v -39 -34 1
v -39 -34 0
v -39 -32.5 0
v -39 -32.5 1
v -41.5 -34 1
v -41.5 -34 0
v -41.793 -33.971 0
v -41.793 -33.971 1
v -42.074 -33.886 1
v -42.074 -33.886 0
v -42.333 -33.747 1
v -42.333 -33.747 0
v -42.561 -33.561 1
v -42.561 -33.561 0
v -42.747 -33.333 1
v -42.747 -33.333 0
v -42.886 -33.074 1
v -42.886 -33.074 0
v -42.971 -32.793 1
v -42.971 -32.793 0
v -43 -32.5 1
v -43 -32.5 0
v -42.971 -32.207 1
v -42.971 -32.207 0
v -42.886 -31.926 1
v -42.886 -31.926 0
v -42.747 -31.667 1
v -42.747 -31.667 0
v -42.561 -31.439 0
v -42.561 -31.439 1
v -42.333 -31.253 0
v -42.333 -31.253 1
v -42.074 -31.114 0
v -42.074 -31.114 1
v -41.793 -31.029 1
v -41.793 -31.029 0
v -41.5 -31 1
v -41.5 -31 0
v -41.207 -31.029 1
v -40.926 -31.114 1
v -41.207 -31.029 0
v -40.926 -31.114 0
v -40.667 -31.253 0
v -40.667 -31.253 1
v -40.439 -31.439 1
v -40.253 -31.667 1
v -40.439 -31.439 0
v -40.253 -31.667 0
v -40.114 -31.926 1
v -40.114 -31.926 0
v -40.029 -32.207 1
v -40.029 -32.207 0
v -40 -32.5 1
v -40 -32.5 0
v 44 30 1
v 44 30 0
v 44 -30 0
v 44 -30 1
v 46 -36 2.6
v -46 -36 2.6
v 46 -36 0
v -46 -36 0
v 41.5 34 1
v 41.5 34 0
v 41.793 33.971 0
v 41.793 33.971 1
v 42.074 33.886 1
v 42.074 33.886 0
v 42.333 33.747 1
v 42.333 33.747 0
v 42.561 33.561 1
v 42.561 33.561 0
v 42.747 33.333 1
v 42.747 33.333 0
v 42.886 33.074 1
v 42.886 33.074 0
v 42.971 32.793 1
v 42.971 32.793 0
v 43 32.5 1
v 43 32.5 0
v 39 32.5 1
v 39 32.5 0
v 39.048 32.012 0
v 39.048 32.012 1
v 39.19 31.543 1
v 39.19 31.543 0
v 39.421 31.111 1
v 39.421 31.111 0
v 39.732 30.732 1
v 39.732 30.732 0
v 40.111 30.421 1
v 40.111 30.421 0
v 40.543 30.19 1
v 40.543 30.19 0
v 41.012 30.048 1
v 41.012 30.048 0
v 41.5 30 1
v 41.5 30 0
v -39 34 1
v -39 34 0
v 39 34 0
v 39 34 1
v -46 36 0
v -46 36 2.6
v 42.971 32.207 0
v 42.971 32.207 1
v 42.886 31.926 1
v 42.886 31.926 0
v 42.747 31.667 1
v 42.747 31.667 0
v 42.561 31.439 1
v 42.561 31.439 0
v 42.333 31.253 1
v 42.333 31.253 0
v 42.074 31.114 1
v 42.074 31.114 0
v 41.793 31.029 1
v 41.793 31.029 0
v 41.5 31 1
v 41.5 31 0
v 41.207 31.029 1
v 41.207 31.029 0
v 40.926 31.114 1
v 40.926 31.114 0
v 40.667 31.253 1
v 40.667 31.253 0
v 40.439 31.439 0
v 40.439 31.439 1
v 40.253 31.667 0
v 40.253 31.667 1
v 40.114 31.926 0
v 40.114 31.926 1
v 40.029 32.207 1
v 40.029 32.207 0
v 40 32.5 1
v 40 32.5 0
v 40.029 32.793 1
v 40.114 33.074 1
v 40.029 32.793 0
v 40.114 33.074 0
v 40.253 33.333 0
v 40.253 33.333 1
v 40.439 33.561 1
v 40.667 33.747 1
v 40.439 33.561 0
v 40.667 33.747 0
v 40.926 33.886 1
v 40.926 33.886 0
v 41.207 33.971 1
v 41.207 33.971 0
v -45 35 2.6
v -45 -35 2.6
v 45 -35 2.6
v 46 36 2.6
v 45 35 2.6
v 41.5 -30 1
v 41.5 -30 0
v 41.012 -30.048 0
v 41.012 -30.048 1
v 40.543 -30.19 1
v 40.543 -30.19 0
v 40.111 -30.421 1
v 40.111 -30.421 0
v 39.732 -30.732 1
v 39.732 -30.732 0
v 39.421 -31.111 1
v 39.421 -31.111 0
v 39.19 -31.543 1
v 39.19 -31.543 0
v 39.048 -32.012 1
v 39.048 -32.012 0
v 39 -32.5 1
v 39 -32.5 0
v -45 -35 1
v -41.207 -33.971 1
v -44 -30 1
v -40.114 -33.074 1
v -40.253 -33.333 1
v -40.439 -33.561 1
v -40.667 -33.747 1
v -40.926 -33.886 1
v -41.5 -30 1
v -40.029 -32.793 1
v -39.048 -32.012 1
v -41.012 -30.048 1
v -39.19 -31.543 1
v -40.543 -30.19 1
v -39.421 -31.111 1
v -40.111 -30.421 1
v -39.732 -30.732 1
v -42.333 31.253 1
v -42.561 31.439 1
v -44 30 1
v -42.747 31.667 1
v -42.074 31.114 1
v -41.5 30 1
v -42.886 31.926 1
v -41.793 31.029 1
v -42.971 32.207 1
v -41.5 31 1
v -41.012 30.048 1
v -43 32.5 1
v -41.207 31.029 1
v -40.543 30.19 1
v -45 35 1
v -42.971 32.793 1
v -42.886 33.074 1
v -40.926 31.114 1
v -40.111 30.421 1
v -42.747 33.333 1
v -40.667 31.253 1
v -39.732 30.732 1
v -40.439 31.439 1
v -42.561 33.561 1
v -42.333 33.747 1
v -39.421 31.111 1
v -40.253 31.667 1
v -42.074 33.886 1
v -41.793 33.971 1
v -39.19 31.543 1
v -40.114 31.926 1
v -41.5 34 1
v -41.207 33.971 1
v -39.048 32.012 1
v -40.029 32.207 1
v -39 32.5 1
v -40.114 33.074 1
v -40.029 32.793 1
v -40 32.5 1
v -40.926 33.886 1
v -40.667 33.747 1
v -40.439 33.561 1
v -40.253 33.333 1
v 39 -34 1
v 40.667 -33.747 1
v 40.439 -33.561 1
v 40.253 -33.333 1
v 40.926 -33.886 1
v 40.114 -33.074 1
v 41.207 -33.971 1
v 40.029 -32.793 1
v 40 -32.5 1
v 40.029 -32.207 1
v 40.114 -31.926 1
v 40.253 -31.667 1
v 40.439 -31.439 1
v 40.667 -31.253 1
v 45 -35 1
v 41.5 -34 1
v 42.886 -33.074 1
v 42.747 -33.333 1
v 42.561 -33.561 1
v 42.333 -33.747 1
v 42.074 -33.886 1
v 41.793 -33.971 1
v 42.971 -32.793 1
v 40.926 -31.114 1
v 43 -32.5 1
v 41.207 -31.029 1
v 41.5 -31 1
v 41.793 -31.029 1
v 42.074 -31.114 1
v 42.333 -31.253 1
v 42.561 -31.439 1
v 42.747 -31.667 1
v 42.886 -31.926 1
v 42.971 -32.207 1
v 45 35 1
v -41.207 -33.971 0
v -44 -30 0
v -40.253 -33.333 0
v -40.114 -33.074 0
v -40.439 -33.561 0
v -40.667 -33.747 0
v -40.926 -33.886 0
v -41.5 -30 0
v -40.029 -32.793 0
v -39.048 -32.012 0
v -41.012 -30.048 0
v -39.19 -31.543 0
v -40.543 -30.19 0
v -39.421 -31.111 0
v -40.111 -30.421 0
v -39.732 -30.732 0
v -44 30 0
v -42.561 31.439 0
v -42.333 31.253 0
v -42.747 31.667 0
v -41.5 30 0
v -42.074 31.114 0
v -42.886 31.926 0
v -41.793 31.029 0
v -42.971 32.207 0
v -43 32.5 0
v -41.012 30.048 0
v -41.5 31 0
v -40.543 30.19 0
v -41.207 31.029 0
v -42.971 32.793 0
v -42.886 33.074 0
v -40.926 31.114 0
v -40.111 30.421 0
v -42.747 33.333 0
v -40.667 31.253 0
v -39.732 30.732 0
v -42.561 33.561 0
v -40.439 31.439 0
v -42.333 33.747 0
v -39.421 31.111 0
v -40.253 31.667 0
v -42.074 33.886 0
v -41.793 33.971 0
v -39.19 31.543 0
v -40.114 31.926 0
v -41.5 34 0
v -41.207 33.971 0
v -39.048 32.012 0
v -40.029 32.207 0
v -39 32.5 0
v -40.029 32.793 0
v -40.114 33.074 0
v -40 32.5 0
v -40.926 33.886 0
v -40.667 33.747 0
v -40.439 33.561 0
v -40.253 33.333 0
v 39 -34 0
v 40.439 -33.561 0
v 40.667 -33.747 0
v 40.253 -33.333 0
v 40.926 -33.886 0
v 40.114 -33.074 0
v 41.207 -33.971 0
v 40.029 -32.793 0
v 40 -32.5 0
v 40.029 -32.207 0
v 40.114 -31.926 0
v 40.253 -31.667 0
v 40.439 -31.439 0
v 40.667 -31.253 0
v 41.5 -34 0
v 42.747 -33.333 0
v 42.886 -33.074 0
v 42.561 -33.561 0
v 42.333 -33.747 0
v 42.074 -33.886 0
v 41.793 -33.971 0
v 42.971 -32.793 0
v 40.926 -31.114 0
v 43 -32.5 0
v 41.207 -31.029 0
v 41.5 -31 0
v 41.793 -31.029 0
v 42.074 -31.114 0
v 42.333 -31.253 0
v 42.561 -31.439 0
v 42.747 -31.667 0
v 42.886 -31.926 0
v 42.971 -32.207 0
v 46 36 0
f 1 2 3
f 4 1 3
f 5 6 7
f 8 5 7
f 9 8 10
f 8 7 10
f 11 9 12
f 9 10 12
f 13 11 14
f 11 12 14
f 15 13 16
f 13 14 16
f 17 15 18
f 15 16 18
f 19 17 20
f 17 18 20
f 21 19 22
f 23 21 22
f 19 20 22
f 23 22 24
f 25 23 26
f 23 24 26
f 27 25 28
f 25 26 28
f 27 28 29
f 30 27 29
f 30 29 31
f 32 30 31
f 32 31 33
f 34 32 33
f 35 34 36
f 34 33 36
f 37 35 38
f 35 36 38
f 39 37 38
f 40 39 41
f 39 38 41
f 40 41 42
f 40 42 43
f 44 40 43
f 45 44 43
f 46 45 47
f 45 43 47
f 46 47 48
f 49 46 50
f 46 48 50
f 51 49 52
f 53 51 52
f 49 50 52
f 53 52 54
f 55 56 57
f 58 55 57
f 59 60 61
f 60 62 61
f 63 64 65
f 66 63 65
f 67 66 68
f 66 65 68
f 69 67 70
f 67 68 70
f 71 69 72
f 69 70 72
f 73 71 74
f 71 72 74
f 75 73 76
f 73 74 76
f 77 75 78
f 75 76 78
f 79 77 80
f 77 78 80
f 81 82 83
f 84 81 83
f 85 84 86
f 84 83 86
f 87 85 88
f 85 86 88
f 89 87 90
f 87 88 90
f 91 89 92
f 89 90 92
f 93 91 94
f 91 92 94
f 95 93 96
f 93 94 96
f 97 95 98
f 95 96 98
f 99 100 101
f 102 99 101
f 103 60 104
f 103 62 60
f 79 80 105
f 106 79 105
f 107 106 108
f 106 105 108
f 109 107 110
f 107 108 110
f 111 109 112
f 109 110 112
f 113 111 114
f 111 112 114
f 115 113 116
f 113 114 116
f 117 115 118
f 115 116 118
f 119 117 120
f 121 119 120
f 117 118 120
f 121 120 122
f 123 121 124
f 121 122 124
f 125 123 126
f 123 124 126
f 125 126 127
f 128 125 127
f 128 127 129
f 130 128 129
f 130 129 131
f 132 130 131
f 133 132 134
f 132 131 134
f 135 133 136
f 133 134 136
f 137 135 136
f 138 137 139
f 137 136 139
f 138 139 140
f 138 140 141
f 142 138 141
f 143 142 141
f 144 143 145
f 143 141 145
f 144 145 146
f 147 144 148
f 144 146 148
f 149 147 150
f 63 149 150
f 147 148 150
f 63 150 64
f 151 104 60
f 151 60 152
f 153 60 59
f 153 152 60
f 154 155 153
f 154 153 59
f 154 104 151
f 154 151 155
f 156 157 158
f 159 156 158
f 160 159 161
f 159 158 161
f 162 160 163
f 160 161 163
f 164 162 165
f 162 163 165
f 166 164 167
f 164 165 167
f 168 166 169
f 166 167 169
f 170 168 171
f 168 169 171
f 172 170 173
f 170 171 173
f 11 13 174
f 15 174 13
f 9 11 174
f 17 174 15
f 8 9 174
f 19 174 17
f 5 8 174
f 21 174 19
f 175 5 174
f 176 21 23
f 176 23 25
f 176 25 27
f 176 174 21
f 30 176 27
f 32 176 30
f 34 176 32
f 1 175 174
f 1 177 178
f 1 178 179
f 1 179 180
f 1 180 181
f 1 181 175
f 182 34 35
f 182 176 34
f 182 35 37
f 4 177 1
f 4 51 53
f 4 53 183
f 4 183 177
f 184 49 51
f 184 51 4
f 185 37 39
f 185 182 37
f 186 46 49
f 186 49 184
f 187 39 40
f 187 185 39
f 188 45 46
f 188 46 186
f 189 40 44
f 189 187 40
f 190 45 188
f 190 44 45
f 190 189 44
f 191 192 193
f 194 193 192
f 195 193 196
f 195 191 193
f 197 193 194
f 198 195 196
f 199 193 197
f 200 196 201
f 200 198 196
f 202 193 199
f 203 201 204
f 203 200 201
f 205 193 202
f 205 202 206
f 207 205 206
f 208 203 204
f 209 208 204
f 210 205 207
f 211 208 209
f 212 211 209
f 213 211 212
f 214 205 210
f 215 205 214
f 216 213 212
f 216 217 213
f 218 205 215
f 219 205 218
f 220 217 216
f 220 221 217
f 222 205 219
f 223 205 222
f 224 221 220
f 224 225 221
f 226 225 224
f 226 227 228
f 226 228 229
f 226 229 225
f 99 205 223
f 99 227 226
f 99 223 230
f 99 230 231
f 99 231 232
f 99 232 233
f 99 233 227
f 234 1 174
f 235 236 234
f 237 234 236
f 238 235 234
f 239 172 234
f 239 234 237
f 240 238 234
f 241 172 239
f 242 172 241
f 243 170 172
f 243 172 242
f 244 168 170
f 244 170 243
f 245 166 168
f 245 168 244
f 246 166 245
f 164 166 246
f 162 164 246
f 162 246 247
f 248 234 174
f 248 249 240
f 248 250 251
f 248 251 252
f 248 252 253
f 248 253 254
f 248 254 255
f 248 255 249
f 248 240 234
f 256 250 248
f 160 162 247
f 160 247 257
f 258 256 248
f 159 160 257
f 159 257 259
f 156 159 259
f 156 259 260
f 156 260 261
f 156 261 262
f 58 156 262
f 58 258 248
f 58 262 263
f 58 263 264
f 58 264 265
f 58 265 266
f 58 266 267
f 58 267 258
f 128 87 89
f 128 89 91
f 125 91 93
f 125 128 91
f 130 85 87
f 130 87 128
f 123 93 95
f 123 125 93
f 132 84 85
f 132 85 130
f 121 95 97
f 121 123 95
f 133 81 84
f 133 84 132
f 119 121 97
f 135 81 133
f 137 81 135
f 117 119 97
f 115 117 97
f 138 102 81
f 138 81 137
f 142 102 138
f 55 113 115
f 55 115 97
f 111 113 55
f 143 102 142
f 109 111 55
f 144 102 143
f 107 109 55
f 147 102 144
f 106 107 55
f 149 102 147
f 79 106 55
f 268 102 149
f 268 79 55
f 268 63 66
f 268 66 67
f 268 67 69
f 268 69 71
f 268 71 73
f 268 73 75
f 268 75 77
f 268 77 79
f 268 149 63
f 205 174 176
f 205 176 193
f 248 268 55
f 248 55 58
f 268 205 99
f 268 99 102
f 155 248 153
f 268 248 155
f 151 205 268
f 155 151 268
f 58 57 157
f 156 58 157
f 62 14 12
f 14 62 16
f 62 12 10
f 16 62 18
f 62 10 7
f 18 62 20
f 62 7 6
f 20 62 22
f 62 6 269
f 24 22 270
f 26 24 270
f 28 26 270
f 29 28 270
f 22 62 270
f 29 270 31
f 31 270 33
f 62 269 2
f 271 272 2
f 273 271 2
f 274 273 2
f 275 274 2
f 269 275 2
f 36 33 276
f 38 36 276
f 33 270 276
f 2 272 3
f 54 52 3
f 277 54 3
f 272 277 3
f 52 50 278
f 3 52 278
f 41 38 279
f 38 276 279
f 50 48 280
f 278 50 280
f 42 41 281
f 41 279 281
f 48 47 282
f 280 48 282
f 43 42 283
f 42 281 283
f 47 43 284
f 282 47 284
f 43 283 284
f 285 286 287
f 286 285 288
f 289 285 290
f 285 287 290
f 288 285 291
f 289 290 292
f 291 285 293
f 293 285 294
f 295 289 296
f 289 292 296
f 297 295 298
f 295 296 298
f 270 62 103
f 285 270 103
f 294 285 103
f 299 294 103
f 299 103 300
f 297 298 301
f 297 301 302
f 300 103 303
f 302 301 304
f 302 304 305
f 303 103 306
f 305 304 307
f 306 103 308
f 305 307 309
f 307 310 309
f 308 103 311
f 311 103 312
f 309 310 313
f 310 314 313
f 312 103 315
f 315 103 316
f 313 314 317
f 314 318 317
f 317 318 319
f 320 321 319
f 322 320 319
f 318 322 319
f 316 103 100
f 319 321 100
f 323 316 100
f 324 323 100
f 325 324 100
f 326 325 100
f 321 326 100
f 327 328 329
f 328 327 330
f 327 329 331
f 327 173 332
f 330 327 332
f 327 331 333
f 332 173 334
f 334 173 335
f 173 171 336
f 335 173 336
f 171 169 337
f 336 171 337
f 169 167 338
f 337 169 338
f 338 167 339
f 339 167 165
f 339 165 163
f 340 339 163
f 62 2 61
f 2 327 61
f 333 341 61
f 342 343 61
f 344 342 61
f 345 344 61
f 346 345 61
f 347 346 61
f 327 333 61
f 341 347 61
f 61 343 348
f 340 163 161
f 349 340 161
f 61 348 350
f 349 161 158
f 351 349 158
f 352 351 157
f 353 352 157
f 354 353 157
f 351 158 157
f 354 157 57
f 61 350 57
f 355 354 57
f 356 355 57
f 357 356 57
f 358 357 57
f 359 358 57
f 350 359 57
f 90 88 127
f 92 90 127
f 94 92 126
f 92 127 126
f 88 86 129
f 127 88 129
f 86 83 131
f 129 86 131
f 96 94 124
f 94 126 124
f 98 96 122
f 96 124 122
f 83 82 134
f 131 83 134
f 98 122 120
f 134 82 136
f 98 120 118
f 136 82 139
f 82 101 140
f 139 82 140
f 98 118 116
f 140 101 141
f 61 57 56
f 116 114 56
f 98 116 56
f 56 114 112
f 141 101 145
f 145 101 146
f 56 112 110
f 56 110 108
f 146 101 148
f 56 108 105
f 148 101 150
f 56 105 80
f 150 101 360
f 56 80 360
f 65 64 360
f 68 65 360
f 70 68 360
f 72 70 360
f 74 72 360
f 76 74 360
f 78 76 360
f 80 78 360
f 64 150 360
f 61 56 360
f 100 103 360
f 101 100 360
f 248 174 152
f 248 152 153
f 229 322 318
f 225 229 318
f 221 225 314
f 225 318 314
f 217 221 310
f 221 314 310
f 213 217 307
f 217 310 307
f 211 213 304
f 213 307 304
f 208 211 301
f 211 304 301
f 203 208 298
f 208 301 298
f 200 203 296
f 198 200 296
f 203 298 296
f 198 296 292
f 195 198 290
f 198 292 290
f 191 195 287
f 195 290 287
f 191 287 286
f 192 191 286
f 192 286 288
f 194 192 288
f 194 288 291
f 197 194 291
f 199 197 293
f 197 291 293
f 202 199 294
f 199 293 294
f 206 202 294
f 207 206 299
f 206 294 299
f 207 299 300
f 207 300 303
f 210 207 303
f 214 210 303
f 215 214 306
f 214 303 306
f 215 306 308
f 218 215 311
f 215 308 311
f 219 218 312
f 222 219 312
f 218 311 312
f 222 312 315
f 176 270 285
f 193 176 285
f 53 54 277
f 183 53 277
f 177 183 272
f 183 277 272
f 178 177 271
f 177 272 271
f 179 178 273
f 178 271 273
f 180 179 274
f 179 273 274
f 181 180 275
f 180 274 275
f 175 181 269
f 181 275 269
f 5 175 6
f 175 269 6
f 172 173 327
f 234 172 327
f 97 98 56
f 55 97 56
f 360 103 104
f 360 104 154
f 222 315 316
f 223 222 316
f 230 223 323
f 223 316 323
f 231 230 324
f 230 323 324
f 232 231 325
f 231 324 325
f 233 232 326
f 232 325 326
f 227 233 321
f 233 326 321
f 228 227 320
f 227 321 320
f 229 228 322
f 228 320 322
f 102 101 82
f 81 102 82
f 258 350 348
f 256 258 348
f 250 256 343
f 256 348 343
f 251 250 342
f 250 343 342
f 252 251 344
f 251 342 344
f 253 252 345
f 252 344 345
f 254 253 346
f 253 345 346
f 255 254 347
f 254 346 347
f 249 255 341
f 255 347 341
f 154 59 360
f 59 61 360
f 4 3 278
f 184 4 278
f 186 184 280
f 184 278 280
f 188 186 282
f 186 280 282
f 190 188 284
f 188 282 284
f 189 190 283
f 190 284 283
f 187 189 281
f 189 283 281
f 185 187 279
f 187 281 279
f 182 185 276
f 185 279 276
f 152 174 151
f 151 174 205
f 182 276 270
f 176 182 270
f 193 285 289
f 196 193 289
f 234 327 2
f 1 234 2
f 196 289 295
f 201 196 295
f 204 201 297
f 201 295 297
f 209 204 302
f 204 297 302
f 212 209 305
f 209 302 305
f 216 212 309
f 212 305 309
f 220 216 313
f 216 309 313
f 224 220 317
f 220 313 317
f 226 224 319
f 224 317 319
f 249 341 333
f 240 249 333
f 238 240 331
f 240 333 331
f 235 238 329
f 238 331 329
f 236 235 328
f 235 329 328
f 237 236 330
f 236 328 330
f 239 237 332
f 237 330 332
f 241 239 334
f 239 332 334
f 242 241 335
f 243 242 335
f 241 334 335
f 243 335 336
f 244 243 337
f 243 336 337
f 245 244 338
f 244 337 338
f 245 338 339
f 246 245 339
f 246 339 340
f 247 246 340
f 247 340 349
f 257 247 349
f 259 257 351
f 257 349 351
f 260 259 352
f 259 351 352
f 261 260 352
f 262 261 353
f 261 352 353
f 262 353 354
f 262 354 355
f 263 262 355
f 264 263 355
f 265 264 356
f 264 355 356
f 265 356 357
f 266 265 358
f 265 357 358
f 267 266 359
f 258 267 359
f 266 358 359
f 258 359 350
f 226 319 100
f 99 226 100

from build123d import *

# Parameters (mm, degrees)
F0_W     = 92
F0_H     = 72
F1_DEPTH = 1
F2_W     = 92
F2_H     = 72
F2_W_2   = 90
F2_H_2   = 70
F3_DEPTH = 1.6


with BuildPart() as f1:
    # F0 (on Top) → F1 (new body)
    with BuildSketch(Plane.XY):
        Rectangle(F0_W, F0_H)
        Polygon((-41.5, 34), (-39, 34), (39, 34), (41.5, 34), (44, 34), (44, 30), (44, -30), (44, -34), (41.5, -34), (39, -34), (-39, -34), (-41.5, -34), (-44, -34), (-44, -30), (-44, 30), (-44, 34), align=None, mode=Mode.SUBTRACT)
        with BuildLine():
            Line((41.5, 34), (39, 34))
            Line((39, 34), (39, 32.5))
            ThreePointArc((39, 32.5), (39.732233, 30.732233), (41.5, 30))
            Line((41.5, 30), (44, 30))
            Line((44, 30), (44, 34))
            Line((44, 34), (41.5, 34))
        make_face()
        with BuildLine():
            ThreePointArc((43, 32.5), (40.43934, 31.43934), (41.5, 34))
            ThreePointArc((41.5, 34), (42.56066, 33.56066), (43, 32.5))
        make_face(mode=Mode.SUBTRACT)
        with BuildLine():
            Line((44, -34), (44, -30))
            Line((44, -30), (41.5, -30))
            ThreePointArc((41.5, -30), (39.732233, -30.732233), (39, -32.5))
            Line((39, -32.5), (39, -34))
            Line((39, -34), (41.5, -34))
            Line((41.5, -34), (44, -34))
        make_face()
        with BuildLine():
            ThreePointArc((43, -32.5), (42.56066, -33.56066), (41.5, -34))
            ThreePointArc((41.5, -34), (40.43934, -31.43934), (43, -32.5))
        make_face(mode=Mode.SUBTRACT)
        with BuildLine():
            Line((-41.5, -30), (-44, -30))
            Line((-44, -30), (-44, -34))
            Line((-44, -34), (-41.5, -34))
            Line((-41.5, -34), (-39, -34))
            Line((-39, -34), (-39, -32.5))
            ThreePointArc((-39, -32.5), (-39.732233, -30.732233), (-41.5, -30))
        make_face()
        with BuildLine():
            ThreePointArc((-40, -32.5), (-40.43934, -33.56066), (-41.5, -34))
            ThreePointArc((-41.5, -34), (-42.56066, -31.43934), (-40, -32.5))
        make_face(mode=Mode.SUBTRACT)
        with BuildLine():
            Line((-39, 32.5), (-39, 34))
            Line((-39, 34), (-41.5, 34))
            Line((-41.5, 34), (-44, 34))
            Line((-44, 34), (-44, 30))
            Line((-44, 30), (-41.5, 30))
            ThreePointArc((-41.5, 30), (-39.732233, 30.732233), (-39, 32.5))
        make_face()
        with BuildLine():
            ThreePointArc((-40, 32.5), (-42.56066, 31.43934), (-41.5, 34))
            ThreePointArc((-41.5, 34), (-40.43934, 33.56066), (-40, 32.5))
        make_face(mode=Mode.SUBTRACT)
    extrude(amount=F1_DEPTH)

    # F2 (on face) → F3 (join)
    with BuildSketch(Plane.XY.offset(1)):
        Rectangle(F2_W, F2_H)
        Rectangle(F2_W_2, F2_H_2, mode=Mode.SUBTRACT)
    extrude(amount=F3_DEPTH)


solid = f1.part
